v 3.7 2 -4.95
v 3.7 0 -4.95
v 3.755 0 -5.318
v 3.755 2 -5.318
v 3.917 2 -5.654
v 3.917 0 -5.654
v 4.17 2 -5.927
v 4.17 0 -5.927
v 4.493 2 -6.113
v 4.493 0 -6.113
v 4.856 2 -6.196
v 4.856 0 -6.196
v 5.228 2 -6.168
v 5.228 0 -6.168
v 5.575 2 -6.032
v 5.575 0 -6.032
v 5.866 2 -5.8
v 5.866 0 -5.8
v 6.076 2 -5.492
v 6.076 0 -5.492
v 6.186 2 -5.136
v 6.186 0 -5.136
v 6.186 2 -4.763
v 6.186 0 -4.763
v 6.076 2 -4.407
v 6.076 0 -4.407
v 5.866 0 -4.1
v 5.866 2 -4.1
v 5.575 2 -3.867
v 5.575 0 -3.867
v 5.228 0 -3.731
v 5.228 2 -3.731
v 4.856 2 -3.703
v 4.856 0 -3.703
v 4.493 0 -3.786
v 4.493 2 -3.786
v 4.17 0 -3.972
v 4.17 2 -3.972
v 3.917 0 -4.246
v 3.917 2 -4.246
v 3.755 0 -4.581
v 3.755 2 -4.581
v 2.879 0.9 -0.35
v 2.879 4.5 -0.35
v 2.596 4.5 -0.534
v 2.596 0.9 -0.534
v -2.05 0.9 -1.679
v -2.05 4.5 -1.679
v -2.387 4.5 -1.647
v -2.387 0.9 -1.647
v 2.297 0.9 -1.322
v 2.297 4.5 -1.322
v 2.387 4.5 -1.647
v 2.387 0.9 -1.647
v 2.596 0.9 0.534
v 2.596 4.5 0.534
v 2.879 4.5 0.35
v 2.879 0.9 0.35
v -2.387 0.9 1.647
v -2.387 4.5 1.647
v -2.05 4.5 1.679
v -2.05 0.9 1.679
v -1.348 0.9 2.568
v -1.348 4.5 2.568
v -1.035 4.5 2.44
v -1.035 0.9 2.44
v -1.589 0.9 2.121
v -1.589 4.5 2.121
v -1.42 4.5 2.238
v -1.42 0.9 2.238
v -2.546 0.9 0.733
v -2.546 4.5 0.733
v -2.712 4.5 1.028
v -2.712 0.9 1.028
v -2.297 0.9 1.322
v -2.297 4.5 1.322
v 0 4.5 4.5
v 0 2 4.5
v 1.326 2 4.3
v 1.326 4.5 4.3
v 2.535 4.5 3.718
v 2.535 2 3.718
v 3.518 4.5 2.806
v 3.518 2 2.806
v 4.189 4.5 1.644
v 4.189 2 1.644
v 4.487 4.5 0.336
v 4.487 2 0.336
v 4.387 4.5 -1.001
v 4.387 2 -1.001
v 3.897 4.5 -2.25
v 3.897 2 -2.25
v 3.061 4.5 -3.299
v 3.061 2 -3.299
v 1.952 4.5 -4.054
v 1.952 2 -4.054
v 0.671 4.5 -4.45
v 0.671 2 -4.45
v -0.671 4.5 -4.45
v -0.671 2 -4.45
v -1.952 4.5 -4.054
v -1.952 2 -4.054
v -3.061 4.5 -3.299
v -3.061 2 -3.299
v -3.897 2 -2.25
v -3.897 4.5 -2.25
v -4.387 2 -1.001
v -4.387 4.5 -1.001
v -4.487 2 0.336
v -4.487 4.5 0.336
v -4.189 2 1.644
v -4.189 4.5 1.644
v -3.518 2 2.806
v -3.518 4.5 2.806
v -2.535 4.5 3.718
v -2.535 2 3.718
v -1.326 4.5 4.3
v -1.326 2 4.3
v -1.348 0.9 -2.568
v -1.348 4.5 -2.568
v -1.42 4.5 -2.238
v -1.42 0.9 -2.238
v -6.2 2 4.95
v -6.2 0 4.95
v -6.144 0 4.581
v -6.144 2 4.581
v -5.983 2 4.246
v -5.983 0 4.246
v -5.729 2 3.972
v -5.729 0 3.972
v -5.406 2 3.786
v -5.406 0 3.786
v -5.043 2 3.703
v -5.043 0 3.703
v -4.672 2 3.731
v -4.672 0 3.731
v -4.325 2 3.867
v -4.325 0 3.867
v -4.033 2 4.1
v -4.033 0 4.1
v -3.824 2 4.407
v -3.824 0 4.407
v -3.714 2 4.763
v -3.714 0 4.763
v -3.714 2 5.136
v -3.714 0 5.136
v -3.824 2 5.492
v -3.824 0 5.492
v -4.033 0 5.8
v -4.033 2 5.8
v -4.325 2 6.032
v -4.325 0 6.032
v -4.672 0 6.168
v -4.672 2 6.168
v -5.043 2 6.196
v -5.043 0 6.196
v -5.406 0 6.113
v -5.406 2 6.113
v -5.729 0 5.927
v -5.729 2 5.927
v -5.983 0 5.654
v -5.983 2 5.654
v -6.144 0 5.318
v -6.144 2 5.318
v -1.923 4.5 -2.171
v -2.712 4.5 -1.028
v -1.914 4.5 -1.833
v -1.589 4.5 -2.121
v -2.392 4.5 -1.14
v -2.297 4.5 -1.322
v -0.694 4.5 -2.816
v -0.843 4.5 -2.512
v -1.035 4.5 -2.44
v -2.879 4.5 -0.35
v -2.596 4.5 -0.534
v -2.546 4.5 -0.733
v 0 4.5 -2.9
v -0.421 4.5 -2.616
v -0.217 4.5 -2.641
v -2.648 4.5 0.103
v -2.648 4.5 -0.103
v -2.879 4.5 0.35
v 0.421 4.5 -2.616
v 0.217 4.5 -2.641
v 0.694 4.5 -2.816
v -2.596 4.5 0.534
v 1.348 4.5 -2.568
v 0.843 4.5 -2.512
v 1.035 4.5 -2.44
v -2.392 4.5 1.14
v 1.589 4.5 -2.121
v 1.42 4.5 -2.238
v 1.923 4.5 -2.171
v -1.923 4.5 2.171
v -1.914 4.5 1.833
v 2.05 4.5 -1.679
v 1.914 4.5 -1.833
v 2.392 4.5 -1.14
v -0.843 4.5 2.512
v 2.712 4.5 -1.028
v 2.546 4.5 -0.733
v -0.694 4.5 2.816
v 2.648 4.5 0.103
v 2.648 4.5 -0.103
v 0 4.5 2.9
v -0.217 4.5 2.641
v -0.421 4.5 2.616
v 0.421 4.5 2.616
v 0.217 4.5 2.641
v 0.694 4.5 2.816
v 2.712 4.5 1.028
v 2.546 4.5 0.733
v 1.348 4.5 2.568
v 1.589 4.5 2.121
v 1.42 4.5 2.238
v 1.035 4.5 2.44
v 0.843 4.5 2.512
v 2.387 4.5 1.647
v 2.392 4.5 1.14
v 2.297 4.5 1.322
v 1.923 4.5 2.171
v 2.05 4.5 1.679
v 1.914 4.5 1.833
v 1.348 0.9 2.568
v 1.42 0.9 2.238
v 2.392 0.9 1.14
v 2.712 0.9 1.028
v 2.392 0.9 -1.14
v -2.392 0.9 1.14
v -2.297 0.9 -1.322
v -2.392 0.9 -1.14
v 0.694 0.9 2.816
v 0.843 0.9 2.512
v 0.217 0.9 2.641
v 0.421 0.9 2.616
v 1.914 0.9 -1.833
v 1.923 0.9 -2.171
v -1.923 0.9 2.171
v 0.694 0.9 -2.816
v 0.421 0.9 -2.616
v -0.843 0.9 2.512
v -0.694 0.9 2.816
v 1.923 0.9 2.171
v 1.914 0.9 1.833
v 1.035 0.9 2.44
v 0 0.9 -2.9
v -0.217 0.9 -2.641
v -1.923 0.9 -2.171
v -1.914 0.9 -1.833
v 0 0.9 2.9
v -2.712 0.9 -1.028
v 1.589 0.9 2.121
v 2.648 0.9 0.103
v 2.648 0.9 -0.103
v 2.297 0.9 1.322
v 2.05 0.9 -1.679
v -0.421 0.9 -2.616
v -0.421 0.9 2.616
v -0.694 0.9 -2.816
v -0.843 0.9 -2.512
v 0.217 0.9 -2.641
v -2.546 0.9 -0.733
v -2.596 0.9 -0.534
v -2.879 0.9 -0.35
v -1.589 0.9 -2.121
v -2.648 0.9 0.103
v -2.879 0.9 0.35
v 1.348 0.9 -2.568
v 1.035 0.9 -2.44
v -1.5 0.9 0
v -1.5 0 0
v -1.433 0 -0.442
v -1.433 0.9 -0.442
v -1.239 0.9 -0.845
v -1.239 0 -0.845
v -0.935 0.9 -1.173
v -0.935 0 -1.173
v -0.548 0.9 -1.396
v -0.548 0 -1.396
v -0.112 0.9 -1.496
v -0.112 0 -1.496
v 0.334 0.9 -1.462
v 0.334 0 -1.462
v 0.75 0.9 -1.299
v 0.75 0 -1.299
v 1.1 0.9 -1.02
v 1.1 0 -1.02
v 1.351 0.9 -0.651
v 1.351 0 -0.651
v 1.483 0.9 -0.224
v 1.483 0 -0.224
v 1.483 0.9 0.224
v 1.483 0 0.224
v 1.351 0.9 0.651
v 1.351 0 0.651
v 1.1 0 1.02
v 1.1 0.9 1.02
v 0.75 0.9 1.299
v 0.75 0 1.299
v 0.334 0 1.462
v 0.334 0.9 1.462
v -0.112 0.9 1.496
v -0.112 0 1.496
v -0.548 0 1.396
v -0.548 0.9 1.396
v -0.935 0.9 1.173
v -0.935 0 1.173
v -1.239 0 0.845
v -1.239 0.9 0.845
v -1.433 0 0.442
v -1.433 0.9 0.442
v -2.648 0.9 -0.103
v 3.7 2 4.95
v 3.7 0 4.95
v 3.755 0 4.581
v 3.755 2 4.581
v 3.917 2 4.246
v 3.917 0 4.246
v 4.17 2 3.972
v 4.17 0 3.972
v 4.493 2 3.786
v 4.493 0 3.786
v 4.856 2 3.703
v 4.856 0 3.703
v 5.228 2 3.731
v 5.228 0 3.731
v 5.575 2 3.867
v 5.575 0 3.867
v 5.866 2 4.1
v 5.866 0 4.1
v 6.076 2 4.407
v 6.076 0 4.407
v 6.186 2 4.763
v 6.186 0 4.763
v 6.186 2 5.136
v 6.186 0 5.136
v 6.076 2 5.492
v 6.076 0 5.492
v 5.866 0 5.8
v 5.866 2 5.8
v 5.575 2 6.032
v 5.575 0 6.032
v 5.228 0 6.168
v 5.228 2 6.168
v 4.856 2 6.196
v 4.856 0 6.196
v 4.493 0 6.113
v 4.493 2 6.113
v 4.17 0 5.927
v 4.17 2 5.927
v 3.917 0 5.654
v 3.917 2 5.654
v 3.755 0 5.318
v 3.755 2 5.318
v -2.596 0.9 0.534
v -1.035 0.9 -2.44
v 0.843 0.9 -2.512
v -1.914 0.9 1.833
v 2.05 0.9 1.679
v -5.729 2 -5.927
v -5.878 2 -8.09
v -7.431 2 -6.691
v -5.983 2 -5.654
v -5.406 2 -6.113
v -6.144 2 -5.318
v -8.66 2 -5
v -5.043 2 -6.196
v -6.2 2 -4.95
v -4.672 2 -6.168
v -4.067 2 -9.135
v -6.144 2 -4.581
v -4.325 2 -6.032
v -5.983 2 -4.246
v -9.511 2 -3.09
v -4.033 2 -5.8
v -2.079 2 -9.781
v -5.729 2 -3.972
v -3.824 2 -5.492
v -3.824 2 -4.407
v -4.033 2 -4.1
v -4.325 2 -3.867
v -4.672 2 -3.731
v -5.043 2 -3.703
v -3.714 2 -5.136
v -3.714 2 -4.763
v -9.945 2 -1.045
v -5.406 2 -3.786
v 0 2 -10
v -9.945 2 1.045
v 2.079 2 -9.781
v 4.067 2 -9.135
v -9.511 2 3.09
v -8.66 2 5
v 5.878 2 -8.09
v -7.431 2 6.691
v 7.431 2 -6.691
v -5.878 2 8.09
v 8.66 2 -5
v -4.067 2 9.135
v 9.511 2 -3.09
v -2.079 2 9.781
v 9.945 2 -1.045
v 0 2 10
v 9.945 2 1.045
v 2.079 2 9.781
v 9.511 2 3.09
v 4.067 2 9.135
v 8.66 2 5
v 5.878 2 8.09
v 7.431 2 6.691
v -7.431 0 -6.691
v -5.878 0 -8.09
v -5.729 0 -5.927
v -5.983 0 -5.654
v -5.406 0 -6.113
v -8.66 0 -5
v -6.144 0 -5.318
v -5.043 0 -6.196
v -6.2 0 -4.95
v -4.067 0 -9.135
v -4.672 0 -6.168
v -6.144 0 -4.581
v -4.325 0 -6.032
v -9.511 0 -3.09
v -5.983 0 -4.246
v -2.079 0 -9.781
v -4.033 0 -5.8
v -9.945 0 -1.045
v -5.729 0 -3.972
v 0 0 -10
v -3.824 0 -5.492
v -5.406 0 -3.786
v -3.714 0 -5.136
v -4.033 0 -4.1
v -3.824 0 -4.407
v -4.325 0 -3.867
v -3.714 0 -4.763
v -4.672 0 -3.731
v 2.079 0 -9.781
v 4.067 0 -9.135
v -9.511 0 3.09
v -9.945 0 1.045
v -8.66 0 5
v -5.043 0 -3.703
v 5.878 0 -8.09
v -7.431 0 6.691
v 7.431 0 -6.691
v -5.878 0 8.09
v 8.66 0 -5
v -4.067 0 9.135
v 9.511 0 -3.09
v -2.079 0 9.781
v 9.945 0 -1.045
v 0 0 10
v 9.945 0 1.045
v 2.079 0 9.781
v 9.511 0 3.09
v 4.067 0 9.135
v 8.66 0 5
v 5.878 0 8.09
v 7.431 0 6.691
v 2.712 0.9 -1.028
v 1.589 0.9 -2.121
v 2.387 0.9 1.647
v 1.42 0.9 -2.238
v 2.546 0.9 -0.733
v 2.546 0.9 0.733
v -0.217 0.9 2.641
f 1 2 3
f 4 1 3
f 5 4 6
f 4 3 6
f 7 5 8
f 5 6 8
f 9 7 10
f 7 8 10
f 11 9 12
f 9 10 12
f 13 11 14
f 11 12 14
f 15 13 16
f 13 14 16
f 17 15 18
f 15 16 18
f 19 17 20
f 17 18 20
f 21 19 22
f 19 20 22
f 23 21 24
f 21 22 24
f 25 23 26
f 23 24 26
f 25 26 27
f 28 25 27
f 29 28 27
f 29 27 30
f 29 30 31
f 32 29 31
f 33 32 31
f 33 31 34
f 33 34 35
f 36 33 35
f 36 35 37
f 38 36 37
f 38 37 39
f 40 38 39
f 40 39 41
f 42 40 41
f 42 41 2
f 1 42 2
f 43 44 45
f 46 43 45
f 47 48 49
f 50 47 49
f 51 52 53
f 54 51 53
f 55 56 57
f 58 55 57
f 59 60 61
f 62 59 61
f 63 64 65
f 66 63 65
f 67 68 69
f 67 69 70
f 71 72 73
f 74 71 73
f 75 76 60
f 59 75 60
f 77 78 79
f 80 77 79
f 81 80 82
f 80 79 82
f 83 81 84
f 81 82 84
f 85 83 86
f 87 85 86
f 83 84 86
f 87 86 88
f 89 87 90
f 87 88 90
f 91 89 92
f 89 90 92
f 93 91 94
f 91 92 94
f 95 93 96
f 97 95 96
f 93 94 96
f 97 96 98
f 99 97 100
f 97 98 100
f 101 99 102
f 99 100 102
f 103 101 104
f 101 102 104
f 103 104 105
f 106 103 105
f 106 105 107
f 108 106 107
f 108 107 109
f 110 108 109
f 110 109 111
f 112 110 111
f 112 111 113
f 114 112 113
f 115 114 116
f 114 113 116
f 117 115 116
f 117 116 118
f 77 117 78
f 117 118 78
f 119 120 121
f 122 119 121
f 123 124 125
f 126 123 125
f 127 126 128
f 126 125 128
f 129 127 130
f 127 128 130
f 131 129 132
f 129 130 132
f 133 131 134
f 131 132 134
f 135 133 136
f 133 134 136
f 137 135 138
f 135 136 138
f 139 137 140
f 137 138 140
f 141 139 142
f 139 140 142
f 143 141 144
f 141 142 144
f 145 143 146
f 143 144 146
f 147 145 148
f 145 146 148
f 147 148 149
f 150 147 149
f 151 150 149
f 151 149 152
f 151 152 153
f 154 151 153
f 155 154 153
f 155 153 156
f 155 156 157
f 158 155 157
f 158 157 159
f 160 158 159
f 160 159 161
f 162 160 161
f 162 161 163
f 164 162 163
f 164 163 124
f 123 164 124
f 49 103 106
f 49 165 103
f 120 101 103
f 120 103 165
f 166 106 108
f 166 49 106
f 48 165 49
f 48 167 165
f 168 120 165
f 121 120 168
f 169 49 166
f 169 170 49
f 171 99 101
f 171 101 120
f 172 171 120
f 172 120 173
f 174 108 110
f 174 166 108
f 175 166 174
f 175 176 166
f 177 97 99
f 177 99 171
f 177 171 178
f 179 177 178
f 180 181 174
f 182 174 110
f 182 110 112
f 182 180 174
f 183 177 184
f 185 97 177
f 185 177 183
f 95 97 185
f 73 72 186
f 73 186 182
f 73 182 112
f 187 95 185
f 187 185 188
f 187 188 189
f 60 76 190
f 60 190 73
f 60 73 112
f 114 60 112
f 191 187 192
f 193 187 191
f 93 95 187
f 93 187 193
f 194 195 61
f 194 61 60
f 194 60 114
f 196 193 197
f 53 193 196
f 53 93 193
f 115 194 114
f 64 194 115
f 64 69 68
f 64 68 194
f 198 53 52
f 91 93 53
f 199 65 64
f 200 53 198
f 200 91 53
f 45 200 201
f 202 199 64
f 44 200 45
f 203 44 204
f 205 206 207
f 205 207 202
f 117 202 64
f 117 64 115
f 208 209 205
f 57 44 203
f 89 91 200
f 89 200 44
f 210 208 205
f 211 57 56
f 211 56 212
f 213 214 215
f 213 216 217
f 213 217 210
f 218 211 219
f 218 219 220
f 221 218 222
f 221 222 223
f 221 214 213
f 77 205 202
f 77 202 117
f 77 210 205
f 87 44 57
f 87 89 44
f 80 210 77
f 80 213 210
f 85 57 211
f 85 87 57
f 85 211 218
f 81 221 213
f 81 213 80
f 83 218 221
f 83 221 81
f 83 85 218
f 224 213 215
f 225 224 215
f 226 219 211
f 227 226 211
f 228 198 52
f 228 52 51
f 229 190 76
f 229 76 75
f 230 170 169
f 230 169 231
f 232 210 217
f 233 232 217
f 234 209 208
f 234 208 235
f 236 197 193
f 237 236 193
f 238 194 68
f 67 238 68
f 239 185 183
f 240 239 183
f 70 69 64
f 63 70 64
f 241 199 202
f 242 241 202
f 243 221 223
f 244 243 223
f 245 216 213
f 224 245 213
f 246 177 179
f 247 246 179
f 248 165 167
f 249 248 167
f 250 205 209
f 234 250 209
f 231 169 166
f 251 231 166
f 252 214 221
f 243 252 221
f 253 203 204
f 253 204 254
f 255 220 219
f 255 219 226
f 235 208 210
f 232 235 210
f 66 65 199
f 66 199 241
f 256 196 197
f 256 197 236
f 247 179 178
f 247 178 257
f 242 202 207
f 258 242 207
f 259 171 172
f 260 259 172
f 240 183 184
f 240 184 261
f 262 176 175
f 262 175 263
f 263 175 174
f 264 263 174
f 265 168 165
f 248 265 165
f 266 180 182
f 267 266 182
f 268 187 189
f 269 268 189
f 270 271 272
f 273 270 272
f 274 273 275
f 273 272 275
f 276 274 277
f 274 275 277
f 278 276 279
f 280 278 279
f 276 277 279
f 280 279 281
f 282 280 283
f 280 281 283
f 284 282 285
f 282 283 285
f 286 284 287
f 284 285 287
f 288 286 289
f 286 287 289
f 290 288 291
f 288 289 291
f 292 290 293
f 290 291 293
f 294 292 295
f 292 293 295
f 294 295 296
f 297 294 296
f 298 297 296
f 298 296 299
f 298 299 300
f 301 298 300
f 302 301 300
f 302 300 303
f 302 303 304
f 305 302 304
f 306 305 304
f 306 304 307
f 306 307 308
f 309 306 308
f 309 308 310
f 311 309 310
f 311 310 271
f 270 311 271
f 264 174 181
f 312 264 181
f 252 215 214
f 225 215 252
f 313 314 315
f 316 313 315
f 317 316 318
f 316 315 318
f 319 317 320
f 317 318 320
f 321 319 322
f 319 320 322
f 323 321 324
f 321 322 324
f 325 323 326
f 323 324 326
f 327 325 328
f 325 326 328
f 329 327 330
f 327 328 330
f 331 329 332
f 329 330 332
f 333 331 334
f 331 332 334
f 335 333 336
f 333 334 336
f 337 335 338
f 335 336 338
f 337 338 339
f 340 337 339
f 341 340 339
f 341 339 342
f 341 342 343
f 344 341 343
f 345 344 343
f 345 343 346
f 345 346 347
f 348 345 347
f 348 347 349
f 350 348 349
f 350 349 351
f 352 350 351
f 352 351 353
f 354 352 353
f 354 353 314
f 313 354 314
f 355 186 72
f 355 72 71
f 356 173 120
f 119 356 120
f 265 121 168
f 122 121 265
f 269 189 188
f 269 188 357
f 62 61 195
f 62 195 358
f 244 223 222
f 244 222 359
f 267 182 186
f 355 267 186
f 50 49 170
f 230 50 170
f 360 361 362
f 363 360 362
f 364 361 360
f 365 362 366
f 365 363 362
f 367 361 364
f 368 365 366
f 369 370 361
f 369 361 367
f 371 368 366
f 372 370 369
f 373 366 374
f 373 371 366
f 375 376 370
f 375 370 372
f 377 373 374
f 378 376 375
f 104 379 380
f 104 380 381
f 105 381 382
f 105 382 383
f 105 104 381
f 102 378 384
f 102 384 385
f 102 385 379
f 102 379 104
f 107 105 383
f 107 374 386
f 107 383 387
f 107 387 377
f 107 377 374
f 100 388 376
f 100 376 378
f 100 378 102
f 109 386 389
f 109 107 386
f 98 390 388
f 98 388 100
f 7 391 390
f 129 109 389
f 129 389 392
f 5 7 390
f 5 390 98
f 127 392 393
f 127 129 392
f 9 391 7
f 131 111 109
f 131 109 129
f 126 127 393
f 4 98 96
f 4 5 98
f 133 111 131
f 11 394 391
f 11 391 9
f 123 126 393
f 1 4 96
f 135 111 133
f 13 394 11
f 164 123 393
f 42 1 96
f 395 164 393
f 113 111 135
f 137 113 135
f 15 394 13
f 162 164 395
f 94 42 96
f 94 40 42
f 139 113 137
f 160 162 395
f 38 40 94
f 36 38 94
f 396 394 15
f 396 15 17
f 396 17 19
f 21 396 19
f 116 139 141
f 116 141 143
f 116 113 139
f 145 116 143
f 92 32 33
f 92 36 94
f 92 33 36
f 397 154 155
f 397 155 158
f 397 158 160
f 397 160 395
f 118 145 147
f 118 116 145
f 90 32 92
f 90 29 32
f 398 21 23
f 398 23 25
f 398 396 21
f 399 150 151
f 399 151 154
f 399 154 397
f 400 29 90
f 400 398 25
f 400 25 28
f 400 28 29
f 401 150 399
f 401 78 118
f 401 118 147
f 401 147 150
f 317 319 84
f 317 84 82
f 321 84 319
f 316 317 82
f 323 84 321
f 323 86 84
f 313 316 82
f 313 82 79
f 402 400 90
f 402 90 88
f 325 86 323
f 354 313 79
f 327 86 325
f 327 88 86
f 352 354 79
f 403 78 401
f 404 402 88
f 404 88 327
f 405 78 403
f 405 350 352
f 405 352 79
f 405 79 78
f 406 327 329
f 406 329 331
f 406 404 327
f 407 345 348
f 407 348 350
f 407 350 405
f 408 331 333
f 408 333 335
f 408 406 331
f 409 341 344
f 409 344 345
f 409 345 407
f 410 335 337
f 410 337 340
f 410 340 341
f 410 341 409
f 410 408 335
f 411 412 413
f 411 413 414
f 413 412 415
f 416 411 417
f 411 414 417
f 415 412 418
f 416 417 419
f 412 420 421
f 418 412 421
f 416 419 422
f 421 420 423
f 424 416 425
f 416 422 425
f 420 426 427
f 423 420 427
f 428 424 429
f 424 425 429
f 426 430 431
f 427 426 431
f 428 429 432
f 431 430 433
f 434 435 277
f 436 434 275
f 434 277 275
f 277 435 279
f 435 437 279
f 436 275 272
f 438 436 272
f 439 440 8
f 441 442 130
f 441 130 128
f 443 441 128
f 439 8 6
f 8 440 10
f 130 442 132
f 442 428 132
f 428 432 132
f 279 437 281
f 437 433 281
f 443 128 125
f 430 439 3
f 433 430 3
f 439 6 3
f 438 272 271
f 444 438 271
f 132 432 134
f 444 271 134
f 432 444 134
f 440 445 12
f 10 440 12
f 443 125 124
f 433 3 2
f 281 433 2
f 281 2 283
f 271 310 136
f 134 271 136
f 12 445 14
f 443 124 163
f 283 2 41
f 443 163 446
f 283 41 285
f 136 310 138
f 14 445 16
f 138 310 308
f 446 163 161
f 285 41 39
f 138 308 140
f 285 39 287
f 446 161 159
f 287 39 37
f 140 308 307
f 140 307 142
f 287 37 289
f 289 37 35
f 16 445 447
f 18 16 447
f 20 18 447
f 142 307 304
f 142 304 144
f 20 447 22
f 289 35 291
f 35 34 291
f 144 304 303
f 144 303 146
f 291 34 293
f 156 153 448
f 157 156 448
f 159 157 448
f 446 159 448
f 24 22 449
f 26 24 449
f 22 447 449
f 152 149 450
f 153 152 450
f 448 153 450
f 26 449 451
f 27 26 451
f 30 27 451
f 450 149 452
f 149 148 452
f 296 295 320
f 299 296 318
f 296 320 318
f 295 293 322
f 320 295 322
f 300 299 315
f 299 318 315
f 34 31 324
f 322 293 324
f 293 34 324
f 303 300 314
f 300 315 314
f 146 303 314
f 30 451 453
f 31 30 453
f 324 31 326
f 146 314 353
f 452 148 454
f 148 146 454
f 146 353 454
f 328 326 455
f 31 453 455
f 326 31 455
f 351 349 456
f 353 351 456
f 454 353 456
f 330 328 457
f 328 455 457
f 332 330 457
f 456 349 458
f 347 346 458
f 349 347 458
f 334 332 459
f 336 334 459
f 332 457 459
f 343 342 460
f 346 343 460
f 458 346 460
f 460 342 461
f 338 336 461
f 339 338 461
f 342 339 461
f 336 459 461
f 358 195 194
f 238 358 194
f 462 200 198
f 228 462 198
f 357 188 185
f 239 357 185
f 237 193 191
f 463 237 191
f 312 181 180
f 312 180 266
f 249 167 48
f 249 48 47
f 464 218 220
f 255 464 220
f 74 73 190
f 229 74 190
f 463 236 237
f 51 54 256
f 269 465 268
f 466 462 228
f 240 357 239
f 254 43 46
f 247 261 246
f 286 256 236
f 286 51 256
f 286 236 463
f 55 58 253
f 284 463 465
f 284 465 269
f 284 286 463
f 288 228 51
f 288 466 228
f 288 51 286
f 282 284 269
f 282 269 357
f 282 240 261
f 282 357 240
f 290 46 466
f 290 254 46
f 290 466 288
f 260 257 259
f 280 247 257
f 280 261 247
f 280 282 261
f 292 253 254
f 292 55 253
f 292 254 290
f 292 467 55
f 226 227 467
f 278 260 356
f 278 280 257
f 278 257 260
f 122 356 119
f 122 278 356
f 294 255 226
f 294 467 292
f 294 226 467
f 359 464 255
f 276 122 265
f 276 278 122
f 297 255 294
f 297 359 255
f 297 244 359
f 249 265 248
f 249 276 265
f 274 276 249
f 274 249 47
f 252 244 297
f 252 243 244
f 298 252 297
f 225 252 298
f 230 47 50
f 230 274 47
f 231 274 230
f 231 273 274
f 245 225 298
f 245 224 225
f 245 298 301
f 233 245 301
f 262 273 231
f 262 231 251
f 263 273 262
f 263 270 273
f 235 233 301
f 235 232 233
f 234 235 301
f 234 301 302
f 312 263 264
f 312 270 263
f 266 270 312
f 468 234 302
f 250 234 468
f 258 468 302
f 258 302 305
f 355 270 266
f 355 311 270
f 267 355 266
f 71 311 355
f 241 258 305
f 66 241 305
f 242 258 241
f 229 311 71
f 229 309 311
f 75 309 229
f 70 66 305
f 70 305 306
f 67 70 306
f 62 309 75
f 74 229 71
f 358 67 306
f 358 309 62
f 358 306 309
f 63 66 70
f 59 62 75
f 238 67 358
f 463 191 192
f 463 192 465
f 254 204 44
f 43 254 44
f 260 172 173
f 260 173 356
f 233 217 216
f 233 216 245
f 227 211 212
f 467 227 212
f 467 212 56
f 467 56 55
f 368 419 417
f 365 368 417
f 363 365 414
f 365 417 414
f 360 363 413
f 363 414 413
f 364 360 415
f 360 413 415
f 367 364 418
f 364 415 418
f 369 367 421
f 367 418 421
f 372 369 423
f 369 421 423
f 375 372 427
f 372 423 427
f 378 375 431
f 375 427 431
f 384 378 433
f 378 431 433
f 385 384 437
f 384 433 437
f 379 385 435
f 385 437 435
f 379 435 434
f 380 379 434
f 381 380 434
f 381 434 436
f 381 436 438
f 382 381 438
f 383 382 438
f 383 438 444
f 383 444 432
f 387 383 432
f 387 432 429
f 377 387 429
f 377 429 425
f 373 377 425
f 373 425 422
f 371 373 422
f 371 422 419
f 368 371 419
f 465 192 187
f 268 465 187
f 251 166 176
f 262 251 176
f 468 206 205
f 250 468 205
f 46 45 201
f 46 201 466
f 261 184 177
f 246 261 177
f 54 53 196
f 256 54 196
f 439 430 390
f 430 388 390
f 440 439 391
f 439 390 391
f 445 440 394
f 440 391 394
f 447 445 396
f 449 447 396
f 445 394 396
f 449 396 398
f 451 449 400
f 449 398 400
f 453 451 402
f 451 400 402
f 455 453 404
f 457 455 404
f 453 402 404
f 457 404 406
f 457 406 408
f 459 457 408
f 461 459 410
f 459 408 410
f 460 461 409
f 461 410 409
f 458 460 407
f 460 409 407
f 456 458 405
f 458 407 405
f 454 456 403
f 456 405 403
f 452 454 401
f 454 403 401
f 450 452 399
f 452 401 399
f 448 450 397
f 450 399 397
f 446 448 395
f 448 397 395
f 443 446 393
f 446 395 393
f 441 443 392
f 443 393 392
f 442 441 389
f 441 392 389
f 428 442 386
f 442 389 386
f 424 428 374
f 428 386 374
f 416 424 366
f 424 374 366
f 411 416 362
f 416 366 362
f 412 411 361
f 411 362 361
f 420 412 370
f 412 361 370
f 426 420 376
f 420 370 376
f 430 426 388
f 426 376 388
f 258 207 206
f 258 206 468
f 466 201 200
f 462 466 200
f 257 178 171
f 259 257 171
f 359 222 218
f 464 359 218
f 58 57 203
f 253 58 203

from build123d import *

# Parameters (mm, degrees)
SKETCH_1_W              = 10
SKETCH_1_H              = 2
SKETCH_2_R              = 4.5
EXTRUDE_1_DEPTH         = 2.5
CUT_EXTRUDE_1_DEPTH     = 3.6
HOLE_WIZARD_3_0_3_1_D   = 3
HOLE_WIZARD_2_5_2_5_1_D = 2.5
CHAMFER_1_SIZE          = 0.140560122
CHAMFER_1_EDGE_2_SIZE   = 0.140560122
CHAMFER_1_EDGE_3_SIZE   = 0.140560122
CHAMFER_1_EDGE_4_SIZE   = 0.140560122
CHAMFER_1_EDGE_5_SIZE   = 0.140560122
CHAMFER_1_EDGE_6_SIZE   = 0.140560122
CHAMFER_1_EDGE_7_SIZE   = 0.140560122
CHAMFER_1_EDGE_8_SIZE   = 0.140560122
CHAMFER_1_EDGE_9_SIZE   = 0.140560122
CHAMFER_1_EDGE_10_SIZE  = 0.140560122
CHAMFER_1_EDGE_11_SIZE  = 0.140560122
CHAMFER_1_EDGE_12_SIZE  = 0.140560122
CHAMFER_1_EDGE_13_SIZE  = 0.140560122
CHAMFER_1_EDGE_14_SIZE  = 0.140560122
CHAMFER_1_EDGE_15_SIZE  = 0.140560122
CHAMFER_1_EDGE_16_SIZE  = 0.140560122
CHAMFER_1_EDGE_17_SIZE  = 0.140560122
CHAMFER_1_EDGE_18_SIZE  = 0.140560122
CHAMFER_1_EDGE_19_SIZE  = 0.140560122
CHAMFER_1_EDGE_20_SIZE  = 0.140560122
CHAMFER_1_EDGE_21_SIZE  = 0.140560122
CHAMFER_1_EDGE_22_SIZE  = 0.140560122
CHAMFER_1_EDGE_23_SIZE  = 0.140560122
CHAMFER_1_EDGE_24_SIZE  = 0.140560122
CHAMFER_1_EDGE_25_SIZE  = 0.140560122
CHAMFER_1_EDGE_26_SIZE  = 0.140560122


with BuildPart() as part:
    # Эскиз1 → Повернуть1 (revolve)
    with BuildSketch(Plane.XY, mode=Mode.PRIVATE) as revolve_1_sk:
        with Locations((5, 1)):
            Rectangle(SKETCH_1_W, SKETCH_1_H)
    revolve(revolve_1_sk.sketch.rotate(Axis((0, 2, 0), (0, -1, 0)), 270), axis=Axis((0, 2, 0), (0, -1, 0)))

    # Эскиз2 → Бобышка-Вытянуть1 (add)
    with BuildSketch(Plane(origin=(0, 2, 0), x_dir=(-1, 0, 0), z_dir=(0, 1, 0))):
        with Locations(Location((0, 0, 0), (0, 0, 90))):
            Circle(SKETCH_2_R)
    extrude(amount=EXTRUDE_1_DEPTH)

    # Эскиз3 → Вырез-Вытянуть1 (cut)
    with BuildSketch(Plane(origin=(0, 4.5, 0), x_dir=(-1, 0, 0), z_dir=(0, 1, 0))):
        Polygon((-2.711547104, 1.028354172), (-2.477853855, 0.610736123), (-2.878855735, 0.349556373), (-2.552010646, 0), (-2.878855735, -0.349556373), (-2.477853855, -0.610736123), (-2.711547104, -1.028354172), (-2.259693204, -1.185978483), (-2.386653211, -1.647387766), (-1.910207398, -1.692296084), (-1.923055709, -2.17068117), (-1.449707281, -2.100263587), (-1.347697199, -2.567822474), (-0.904955447, -2.386171406), (-0.694015426, -2.815731271), (-0.307610891, -2.533403615), (0, -2.9), (0.307610891, -2.533403615), (0.694015426, -2.815731271), (0.904955447, -2.386171406), (1.347697199, -2.567822474), (1.449707281, -2.100263587), (1.923055709, -2.17068117), (1.910207398, -1.692296084), (2.386653211, -1.647387766), (2.259693204, -1.185978483), (2.711547104, -1.028354172), (2.477853855, -0.610736123), (2.878855735, -0.349556373), (2.552010646, 0), (2.878855735, 0.349556373), (2.477853855, 0.610736123), (2.711547104, 1.028354172), (2.259693204, 1.185978483), (2.386653211, 1.647387766), (1.910207398, 1.692296084), (1.923055709, 2.17068117), (1.449707281, 2.100263587), (1.347697199, 2.567822474), (0.904955447, 2.386171406), (0.694015426, 2.815731271), (0.307610891, 2.533403615), (0, 2.9), (-0.307610891, 2.533403615), (-0.694015426, 2.815731271), (-0.904955447, 2.386171406), (-1.347697199, 2.567822474), (-1.449707281, 2.100263587), (-1.923055709, 2.17068117), (-1.910207398, 1.692296084), (-2.386653211, 1.647387766), (-2.259693204, 1.185978483), align=None)
    extrude(amount=-CUT_EXTRUDE_1_DEPTH, mode=Mode.SUBTRACT)

    # Диаметр отверстия Ø3.0 (3)1 (through all)
    with Locations(Plane(origin=(0, 0.9, 0), x_dir=(1, 0, 0), z_dir=(0, 1, 0))):
        with Locations((0, 0)):
            Hole(HOLE_WIZARD_3_0_3_1_D / 2)

    # Диаметр отверстия Ø2.5 (2.5)1 (through all)
    with Locations(Plane(origin=(0, 2, 0), x_dir=(1, 0, 0), z_dir=(0, 1, 0))):
        with Locations((-4.949747468, 4.949747468), (4.949747468, 4.949747468), (4.949747468, -4.949747468), (-4.949747468, -4.949747468)):
            Hole(HOLE_WIZARD_2_5_2_5_1_D / 2)

    # Фаска1
    chamfer_1_edges = [part.edges().sort_by_distance(p)[0] for p in [
        (2.259693204, 2.7, 1.185978483),
    ]]
    chamfer(chamfer_1_edges, length=CHAMFER_1_SIZE)

    # Фаска1 edge 2
    chamfer_1_edge_2_edges = [part.edges().sort_by_distance(p)[0] for p in [
        (1.910207398, 2.7, 1.692296084),
    ]]
    chamfer(chamfer_1_edge_2_edges, length=CHAMFER_1_EDGE_2_SIZE)

    # Фаска1 edge 3
    chamfer_1_edge_3_edges = [part.edges().sort_by_distance(p)[0] for p in [
        (1.449707281, 2.7, 2.100263587),
    ]]
    chamfer(chamfer_1_edge_3_edges, length=CHAMFER_1_EDGE_3_SIZE)

    # Фаска1 edge 4
    chamfer_1_edge_4_edges = [part.edges().sort_by_distance(p)[0] for p in [
        (0.904955447, 2.7, 2.386171406),
    ]]
    chamfer(chamfer_1_edge_4_edges, length=CHAMFER_1_EDGE_4_SIZE)

    # Фаска1 edge 5
    chamfer_1_edge_5_edges = [part.edges().sort_by_distance(p)[0] for p in [
        (0.307610891, 2.7, 2.533403615),
    ]]
    chamfer(chamfer_1_edge_5_edges, length=CHAMFER_1_EDGE_5_SIZE)

    # Фаска1 edge 6
    chamfer_1_edge_6_edges = [part.edges().sort_by_distance(p)[0] for p in [
        (-0.307610891, 2.7, 2.533403615),
    ]]
    chamfer(chamfer_1_edge_6_edges, length=CHAMFER_1_EDGE_6_SIZE)

    # Фаска1 edge 7
    chamfer_1_edge_7_edges = [part.edges().sort_by_distance(p)[0] for p in [
        (-0.904955447, 2.7, 2.386171406),
    ]]
    chamfer(chamfer_1_edge_7_edges, length=CHAMFER_1_EDGE_7_SIZE)

    # Фаска1 edge 8
    chamfer_1_edge_8_edges = [part.edges().sort_by_distance(p)[0] for p in [
        (-1.449707281, 2.7, 2.100263587),
    ]]
    chamfer(chamfer_1_edge_8_edges, length=CHAMFER_1_EDGE_8_SIZE)

    # Фаска1 edge 9
    chamfer_1_edge_9_edges = [part.edges().sort_by_distance(p)[0] for p in [
        (-1.910207398, 2.7, 1.692296084),
    ]]
    chamfer(chamfer_1_edge_9_edges, length=CHAMFER_1_EDGE_9_SIZE)

    # Фаска1 edge 10
    chamfer_1_edge_10_edges = [part.edges().sort_by_distance(p)[0] for p in [
        (-2.259693204, 2.7, 1.185978483),
    ]]
    chamfer(chamfer_1_edge_10_edges, length=CHAMFER_1_EDGE_10_SIZE)

    # Фаска1 edge 11
    chamfer_1_edge_11_edges = [part.edges().sort_by_distance(p)[0] for p in [
        (-2.477853855, 2.7, 0.610736123),
    ]]
    chamfer(chamfer_1_edge_11_edges, length=CHAMFER_1_EDGE_11_SIZE)

    # Фаска1 edge 12
    chamfer_1_edge_12_edges = [part.edges().sort_by_distance(p)[0] for p in [
        (-2.552010646, 2.7, 0),
    ]]
    chamfer(chamfer_1_edge_12_edges, length=CHAMFER_1_EDGE_12_SIZE)

    # Фаска1 edge 13
    chamfer_1_edge_13_edges = [part.edges().sort_by_distance(p)[0] for p in [
        (-2.477853855, 2.7, -0.610736123),
    ]]
    chamfer(chamfer_1_edge_13_edges, length=CHAMFER_1_EDGE_13_SIZE)

    # Фаска1 edge 14
    chamfer_1_edge_14_edges = [part.edges().sort_by_distance(p)[0] for p in [
        (-2.259693204, 2.7, -1.185978483),
    ]]
    chamfer(chamfer_1_edge_14_edges, length=CHAMFER_1_EDGE_14_SIZE)

    # Фаска1 edge 15
    chamfer_1_edge_15_edges = [part.edges().sort_by_distance(p)[0] for p in [
        (-1.910207398, 2.7, -1.692296084),
    ]]
    chamfer(chamfer_1_edge_15_edges, length=CHAMFER_1_EDGE_15_SIZE)

    # Фаска1 edge 16
    chamfer_1_edge_16_edges = [part.edges().sort_by_distance(p)[0] for p in [
        (-1.449707281, 2.7, -2.100263587),
    ]]
    chamfer(chamfer_1_edge_16_edges, length=CHAMFER_1_EDGE_16_SIZE)

    # Фаска1 edge 17
    chamfer_1_edge_17_edges = [part.edges().sort_by_distance(p)[0] for p in [
        (-0.904955447, 2.7, -2.386171406),
    ]]
    chamfer(chamfer_1_edge_17_edges, length=CHAMFER_1_EDGE_17_SIZE)

    # Фаска1 edge 18
    chamfer_1_edge_18_edges = [part.edges().sort_by_distance(p)[0] for p in [
        (-0.307610891, 2.7, -2.533403615),
    ]]
    chamfer(chamfer_1_edge_18_edges, length=CHAMFER_1_EDGE_18_SIZE)

    # Фаска1 edge 19
    chamfer_1_edge_19_edges = [part.edges().sort_by_distance(p)[0] for p in [
        (0.307610891, 2.7, -2.533403615),
    ]]
    chamfer(chamfer_1_edge_19_edges, length=CHAMFER_1_EDGE_19_SIZE)

    # Фаска1 edge 20
    chamfer_1_edge_20_edges = [part.edges().sort_by_distance(p)[0] for p in [
        (0.904955447, 2.7, -2.386171406),
    ]]
    chamfer(chamfer_1_edge_20_edges, length=CHAMFER_1_EDGE_20_SIZE)

    # Фаска1 edge 21
    chamfer_1_edge_21_edges = [part.edges().sort_by_distance(p)[0] for p in [
        (1.449707281, 2.7, -2.100263587),
    ]]
    chamfer(chamfer_1_edge_21_edges, length=CHAMFER_1_EDGE_21_SIZE)

    # Фаска1 edge 22
    chamfer_1_edge_22_edges = [part.edges().sort_by_distance(p)[0] for p in [
        (1.910207398, 2.7, -1.692296084),
    ]]
    chamfer(chamfer_1_edge_22_edges, length=CHAMFER_1_EDGE_22_SIZE)

    # Фаска1 edge 23
    chamfer_1_edge_23_edges = [part.edges().sort_by_distance(p)[0] for p in [
        (2.259693204, 2.7, -1.185978483),
    ]]
    chamfer(chamfer_1_edge_23_edges, length=CHAMFER_1_EDGE_23_SIZE)

    # Фаска1 edge 24
    chamfer_1_edge_24_edges = [part.edges().sort_by_distance(p)[0] for p in [
        (2.477853855, 2.7, -0.610736123),
    ]]
    chamfer(chamfer_1_edge_24_edges, length=CHAMFER_1_EDGE_24_SIZE)

    # Фаска1 edge 25
    chamfer_1_edge_25_edges = [part.edges().sort_by_distance(p)[0] for p in [
        (2.552010646, 2.7, 0),
    ]]
    chamfer(chamfer_1_edge_25_edges, length=CHAMFER_1_EDGE_25_SIZE)

    # Фаска1 edge 26
    chamfer_1_edge_26_edges = [part.edges().sort_by_distance(p)[0] for p in [
        (2.477853855, 2.7, 0.610736123),
    ]]
    chamfer(chamfer_1_edge_26_edges, length=CHAMFER_1_EDGE_26_SIZE)


solid = part.part
